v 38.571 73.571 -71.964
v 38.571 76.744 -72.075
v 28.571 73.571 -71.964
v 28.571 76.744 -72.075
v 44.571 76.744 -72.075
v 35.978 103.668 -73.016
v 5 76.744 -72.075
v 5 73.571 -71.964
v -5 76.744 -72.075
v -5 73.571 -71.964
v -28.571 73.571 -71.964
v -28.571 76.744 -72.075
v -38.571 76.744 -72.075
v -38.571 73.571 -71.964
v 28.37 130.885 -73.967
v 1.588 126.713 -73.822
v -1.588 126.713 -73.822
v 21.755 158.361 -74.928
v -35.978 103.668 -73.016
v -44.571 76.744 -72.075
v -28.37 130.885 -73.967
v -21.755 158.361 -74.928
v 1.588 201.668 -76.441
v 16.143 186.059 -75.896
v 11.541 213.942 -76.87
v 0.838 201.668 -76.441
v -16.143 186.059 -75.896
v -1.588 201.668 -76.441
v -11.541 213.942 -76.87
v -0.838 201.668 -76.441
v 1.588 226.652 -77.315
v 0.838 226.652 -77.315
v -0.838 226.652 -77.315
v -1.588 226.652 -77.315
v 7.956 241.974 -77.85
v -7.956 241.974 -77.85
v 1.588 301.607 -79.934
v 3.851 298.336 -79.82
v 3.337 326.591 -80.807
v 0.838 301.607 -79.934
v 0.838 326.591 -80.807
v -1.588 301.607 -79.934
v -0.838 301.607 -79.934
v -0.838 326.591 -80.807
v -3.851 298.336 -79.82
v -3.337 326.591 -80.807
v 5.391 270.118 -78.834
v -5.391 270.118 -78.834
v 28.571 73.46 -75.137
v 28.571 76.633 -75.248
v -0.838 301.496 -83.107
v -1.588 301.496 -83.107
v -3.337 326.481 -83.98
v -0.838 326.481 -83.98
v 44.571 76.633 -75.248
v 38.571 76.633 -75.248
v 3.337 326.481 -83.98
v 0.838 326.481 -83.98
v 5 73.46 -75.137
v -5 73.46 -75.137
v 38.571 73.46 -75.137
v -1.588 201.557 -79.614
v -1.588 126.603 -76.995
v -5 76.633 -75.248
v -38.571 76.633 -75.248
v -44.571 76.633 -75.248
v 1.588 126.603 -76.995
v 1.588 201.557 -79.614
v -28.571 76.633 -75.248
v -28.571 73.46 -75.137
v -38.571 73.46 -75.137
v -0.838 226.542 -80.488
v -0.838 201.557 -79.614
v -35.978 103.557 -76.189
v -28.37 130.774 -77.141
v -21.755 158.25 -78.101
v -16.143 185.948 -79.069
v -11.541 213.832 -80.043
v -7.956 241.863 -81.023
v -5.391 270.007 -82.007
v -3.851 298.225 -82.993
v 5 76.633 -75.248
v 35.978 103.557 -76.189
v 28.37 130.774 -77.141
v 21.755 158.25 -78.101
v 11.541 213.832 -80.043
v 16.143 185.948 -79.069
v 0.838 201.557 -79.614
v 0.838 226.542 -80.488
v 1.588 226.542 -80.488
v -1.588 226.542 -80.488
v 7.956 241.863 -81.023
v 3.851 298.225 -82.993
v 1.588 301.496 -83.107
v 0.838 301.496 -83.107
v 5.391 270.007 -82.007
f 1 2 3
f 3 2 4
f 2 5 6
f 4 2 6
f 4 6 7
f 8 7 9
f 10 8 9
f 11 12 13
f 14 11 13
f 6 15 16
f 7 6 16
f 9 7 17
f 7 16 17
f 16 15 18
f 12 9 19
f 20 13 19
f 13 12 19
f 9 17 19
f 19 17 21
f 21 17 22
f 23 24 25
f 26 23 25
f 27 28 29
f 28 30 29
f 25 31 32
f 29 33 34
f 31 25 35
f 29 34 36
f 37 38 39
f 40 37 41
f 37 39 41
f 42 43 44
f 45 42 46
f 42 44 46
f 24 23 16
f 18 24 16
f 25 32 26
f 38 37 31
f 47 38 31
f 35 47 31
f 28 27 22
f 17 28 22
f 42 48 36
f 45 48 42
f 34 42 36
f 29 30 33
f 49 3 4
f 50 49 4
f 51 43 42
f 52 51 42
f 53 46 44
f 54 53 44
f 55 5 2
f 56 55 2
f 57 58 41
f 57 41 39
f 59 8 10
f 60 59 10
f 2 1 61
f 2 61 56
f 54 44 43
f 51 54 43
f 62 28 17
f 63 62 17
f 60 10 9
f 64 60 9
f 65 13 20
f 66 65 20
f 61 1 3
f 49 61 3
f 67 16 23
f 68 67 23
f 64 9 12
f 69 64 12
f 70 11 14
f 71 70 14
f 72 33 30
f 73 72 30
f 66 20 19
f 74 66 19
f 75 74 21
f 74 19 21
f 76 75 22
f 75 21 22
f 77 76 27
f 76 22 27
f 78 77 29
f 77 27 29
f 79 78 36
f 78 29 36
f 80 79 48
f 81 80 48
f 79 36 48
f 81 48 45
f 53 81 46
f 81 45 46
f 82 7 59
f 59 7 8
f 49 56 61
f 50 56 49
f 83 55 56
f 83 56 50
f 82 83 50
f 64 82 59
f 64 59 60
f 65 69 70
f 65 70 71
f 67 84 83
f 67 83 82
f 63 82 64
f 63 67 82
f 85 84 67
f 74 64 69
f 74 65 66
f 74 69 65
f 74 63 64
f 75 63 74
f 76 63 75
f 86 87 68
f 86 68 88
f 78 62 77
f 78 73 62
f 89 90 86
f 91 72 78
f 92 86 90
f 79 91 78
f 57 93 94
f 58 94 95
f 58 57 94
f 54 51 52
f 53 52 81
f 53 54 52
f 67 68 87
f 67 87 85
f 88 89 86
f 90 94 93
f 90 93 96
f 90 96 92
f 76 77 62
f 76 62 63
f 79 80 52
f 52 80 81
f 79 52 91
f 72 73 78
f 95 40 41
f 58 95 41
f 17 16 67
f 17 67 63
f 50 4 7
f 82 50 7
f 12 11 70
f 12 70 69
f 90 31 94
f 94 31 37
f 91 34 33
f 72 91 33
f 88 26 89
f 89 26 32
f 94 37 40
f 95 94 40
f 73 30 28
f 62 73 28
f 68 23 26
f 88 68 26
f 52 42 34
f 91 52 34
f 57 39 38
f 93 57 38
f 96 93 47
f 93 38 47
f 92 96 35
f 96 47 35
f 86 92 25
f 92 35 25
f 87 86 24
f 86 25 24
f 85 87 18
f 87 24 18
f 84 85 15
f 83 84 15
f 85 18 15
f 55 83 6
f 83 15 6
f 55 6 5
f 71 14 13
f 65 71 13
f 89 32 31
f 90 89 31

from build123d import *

# Parameters (mm, degrees)
SKETCH1_W           = 10
SKETCH1_H           = 3.175
SKETCH1_W_2         = 3.175
SKETCH1_H_2         = 50
BOSS_EXTRUDE1_DEPTH = 3.175


with BuildPart() as part:
    # Sketch1 → Boss-Extrude1 (new body)
    with BuildSketch(Plane(origin=(0, -2.422329102, -69.308356399), x_dir=(-1, 0, 0), z_dir=(0, -0.03492870325036369, -0.9993898066766782))):
        with BuildLine():
            Line((-5, 79.214647081), (-1.5875, 79.214647081))
            Line((-1.5875, 79.214647081), (-1.5875, 129.214647081))
            Line((-1.5875, 129.214647081), (-1.5875, 204.214647081))
            Line((-1.5875, 204.214647081), (-0.8375, 204.214647081))
            Line((-0.8375, 204.214647081), (-0.8375, 229.214647081))
            Line((-0.8375, 229.214647081), (-1.5875, 229.214647081))
            Line((-1.5875, 229.214647081), (-1.5875, 304.214647081))
            Line((-1.5875, 304.214647081), (-0.8375, 304.214647081))
            Line((-0.8375, 304.214647081), (-0.8375, 329.214647081))
            Line((-0.8375, 329.214647081), (-3.3375, 329.214647081))
            ThreePointArc((-3.3375, 329.214647081), (-13.715159098, 202.525816485), (-44.57145678, 79.214647081))
            Line((-44.57145678, 79.214647081), (-38.57145678, 79.214647081))
            Line((-38.57145678, 79.214647081), (-28.57145678, 79.214647081))
            Line((-28.57145678, 79.214647081), (-5, 79.214647081))
        make_face()
        with BuildLine():
            ThreePointArc((44.57145678, 79.214647081), (13.715159098, 202.525816485), (3.3375, 329.214647081))
            Line((3.3375, 329.214647081), (0.8375, 329.214647081))
            Line((0.8375, 329.214647081), (0.8375, 304.214647081))
            Line((0.8375, 304.214647081), (1.5875, 304.214647081))
            Line((1.5875, 304.214647081), (1.5875, 229.214647081))
            Line((1.5875, 229.214647081), (0.8375, 229.214647081))
            Line((0.8375, 229.214647081), (0.8375, 204.214647081))
            Line((0.8375, 204.214647081), (1.5875, 204.214647081))
            Line((1.5875, 204.214647081), (1.5875, 129.214647081))
            Line((1.5875, 129.214647081), (1.5875, 79.214647081))
            Line((1.5875, 79.214647081), (5, 79.214647081))
            Line((5, 79.214647081), (28.57145678, 79.214647081))
            Line((28.57145678, 79.214647081), (38.57145678, 79.214647081))
            Line((38.57145678, 79.214647081), (44.57145678, 79.214647081))
        make_face()
        Polygon((5, 76.039647081), (5, 79.214647081), (1.5875, 79.214647081), (-1.5875, 79.214647081), (-5, 79.214647081), (-5, 76.039647081), align=None)
        with Locations((33.57145678, 77.627147081)):
            Rectangle(SKETCH1_W, SKETCH1_H)
        with Locations((0, 104.214647081)):
            Rectangle(SKETCH1_W_2, SKETCH1_H_2)
        with Locations((-33.57145678, 77.627147081)):
            Rectangle(SKETCH1_W, SKETCH1_H)
    extrude(amount=BOSS_EXTRUDE1_DEPTH)


solid = part.part
